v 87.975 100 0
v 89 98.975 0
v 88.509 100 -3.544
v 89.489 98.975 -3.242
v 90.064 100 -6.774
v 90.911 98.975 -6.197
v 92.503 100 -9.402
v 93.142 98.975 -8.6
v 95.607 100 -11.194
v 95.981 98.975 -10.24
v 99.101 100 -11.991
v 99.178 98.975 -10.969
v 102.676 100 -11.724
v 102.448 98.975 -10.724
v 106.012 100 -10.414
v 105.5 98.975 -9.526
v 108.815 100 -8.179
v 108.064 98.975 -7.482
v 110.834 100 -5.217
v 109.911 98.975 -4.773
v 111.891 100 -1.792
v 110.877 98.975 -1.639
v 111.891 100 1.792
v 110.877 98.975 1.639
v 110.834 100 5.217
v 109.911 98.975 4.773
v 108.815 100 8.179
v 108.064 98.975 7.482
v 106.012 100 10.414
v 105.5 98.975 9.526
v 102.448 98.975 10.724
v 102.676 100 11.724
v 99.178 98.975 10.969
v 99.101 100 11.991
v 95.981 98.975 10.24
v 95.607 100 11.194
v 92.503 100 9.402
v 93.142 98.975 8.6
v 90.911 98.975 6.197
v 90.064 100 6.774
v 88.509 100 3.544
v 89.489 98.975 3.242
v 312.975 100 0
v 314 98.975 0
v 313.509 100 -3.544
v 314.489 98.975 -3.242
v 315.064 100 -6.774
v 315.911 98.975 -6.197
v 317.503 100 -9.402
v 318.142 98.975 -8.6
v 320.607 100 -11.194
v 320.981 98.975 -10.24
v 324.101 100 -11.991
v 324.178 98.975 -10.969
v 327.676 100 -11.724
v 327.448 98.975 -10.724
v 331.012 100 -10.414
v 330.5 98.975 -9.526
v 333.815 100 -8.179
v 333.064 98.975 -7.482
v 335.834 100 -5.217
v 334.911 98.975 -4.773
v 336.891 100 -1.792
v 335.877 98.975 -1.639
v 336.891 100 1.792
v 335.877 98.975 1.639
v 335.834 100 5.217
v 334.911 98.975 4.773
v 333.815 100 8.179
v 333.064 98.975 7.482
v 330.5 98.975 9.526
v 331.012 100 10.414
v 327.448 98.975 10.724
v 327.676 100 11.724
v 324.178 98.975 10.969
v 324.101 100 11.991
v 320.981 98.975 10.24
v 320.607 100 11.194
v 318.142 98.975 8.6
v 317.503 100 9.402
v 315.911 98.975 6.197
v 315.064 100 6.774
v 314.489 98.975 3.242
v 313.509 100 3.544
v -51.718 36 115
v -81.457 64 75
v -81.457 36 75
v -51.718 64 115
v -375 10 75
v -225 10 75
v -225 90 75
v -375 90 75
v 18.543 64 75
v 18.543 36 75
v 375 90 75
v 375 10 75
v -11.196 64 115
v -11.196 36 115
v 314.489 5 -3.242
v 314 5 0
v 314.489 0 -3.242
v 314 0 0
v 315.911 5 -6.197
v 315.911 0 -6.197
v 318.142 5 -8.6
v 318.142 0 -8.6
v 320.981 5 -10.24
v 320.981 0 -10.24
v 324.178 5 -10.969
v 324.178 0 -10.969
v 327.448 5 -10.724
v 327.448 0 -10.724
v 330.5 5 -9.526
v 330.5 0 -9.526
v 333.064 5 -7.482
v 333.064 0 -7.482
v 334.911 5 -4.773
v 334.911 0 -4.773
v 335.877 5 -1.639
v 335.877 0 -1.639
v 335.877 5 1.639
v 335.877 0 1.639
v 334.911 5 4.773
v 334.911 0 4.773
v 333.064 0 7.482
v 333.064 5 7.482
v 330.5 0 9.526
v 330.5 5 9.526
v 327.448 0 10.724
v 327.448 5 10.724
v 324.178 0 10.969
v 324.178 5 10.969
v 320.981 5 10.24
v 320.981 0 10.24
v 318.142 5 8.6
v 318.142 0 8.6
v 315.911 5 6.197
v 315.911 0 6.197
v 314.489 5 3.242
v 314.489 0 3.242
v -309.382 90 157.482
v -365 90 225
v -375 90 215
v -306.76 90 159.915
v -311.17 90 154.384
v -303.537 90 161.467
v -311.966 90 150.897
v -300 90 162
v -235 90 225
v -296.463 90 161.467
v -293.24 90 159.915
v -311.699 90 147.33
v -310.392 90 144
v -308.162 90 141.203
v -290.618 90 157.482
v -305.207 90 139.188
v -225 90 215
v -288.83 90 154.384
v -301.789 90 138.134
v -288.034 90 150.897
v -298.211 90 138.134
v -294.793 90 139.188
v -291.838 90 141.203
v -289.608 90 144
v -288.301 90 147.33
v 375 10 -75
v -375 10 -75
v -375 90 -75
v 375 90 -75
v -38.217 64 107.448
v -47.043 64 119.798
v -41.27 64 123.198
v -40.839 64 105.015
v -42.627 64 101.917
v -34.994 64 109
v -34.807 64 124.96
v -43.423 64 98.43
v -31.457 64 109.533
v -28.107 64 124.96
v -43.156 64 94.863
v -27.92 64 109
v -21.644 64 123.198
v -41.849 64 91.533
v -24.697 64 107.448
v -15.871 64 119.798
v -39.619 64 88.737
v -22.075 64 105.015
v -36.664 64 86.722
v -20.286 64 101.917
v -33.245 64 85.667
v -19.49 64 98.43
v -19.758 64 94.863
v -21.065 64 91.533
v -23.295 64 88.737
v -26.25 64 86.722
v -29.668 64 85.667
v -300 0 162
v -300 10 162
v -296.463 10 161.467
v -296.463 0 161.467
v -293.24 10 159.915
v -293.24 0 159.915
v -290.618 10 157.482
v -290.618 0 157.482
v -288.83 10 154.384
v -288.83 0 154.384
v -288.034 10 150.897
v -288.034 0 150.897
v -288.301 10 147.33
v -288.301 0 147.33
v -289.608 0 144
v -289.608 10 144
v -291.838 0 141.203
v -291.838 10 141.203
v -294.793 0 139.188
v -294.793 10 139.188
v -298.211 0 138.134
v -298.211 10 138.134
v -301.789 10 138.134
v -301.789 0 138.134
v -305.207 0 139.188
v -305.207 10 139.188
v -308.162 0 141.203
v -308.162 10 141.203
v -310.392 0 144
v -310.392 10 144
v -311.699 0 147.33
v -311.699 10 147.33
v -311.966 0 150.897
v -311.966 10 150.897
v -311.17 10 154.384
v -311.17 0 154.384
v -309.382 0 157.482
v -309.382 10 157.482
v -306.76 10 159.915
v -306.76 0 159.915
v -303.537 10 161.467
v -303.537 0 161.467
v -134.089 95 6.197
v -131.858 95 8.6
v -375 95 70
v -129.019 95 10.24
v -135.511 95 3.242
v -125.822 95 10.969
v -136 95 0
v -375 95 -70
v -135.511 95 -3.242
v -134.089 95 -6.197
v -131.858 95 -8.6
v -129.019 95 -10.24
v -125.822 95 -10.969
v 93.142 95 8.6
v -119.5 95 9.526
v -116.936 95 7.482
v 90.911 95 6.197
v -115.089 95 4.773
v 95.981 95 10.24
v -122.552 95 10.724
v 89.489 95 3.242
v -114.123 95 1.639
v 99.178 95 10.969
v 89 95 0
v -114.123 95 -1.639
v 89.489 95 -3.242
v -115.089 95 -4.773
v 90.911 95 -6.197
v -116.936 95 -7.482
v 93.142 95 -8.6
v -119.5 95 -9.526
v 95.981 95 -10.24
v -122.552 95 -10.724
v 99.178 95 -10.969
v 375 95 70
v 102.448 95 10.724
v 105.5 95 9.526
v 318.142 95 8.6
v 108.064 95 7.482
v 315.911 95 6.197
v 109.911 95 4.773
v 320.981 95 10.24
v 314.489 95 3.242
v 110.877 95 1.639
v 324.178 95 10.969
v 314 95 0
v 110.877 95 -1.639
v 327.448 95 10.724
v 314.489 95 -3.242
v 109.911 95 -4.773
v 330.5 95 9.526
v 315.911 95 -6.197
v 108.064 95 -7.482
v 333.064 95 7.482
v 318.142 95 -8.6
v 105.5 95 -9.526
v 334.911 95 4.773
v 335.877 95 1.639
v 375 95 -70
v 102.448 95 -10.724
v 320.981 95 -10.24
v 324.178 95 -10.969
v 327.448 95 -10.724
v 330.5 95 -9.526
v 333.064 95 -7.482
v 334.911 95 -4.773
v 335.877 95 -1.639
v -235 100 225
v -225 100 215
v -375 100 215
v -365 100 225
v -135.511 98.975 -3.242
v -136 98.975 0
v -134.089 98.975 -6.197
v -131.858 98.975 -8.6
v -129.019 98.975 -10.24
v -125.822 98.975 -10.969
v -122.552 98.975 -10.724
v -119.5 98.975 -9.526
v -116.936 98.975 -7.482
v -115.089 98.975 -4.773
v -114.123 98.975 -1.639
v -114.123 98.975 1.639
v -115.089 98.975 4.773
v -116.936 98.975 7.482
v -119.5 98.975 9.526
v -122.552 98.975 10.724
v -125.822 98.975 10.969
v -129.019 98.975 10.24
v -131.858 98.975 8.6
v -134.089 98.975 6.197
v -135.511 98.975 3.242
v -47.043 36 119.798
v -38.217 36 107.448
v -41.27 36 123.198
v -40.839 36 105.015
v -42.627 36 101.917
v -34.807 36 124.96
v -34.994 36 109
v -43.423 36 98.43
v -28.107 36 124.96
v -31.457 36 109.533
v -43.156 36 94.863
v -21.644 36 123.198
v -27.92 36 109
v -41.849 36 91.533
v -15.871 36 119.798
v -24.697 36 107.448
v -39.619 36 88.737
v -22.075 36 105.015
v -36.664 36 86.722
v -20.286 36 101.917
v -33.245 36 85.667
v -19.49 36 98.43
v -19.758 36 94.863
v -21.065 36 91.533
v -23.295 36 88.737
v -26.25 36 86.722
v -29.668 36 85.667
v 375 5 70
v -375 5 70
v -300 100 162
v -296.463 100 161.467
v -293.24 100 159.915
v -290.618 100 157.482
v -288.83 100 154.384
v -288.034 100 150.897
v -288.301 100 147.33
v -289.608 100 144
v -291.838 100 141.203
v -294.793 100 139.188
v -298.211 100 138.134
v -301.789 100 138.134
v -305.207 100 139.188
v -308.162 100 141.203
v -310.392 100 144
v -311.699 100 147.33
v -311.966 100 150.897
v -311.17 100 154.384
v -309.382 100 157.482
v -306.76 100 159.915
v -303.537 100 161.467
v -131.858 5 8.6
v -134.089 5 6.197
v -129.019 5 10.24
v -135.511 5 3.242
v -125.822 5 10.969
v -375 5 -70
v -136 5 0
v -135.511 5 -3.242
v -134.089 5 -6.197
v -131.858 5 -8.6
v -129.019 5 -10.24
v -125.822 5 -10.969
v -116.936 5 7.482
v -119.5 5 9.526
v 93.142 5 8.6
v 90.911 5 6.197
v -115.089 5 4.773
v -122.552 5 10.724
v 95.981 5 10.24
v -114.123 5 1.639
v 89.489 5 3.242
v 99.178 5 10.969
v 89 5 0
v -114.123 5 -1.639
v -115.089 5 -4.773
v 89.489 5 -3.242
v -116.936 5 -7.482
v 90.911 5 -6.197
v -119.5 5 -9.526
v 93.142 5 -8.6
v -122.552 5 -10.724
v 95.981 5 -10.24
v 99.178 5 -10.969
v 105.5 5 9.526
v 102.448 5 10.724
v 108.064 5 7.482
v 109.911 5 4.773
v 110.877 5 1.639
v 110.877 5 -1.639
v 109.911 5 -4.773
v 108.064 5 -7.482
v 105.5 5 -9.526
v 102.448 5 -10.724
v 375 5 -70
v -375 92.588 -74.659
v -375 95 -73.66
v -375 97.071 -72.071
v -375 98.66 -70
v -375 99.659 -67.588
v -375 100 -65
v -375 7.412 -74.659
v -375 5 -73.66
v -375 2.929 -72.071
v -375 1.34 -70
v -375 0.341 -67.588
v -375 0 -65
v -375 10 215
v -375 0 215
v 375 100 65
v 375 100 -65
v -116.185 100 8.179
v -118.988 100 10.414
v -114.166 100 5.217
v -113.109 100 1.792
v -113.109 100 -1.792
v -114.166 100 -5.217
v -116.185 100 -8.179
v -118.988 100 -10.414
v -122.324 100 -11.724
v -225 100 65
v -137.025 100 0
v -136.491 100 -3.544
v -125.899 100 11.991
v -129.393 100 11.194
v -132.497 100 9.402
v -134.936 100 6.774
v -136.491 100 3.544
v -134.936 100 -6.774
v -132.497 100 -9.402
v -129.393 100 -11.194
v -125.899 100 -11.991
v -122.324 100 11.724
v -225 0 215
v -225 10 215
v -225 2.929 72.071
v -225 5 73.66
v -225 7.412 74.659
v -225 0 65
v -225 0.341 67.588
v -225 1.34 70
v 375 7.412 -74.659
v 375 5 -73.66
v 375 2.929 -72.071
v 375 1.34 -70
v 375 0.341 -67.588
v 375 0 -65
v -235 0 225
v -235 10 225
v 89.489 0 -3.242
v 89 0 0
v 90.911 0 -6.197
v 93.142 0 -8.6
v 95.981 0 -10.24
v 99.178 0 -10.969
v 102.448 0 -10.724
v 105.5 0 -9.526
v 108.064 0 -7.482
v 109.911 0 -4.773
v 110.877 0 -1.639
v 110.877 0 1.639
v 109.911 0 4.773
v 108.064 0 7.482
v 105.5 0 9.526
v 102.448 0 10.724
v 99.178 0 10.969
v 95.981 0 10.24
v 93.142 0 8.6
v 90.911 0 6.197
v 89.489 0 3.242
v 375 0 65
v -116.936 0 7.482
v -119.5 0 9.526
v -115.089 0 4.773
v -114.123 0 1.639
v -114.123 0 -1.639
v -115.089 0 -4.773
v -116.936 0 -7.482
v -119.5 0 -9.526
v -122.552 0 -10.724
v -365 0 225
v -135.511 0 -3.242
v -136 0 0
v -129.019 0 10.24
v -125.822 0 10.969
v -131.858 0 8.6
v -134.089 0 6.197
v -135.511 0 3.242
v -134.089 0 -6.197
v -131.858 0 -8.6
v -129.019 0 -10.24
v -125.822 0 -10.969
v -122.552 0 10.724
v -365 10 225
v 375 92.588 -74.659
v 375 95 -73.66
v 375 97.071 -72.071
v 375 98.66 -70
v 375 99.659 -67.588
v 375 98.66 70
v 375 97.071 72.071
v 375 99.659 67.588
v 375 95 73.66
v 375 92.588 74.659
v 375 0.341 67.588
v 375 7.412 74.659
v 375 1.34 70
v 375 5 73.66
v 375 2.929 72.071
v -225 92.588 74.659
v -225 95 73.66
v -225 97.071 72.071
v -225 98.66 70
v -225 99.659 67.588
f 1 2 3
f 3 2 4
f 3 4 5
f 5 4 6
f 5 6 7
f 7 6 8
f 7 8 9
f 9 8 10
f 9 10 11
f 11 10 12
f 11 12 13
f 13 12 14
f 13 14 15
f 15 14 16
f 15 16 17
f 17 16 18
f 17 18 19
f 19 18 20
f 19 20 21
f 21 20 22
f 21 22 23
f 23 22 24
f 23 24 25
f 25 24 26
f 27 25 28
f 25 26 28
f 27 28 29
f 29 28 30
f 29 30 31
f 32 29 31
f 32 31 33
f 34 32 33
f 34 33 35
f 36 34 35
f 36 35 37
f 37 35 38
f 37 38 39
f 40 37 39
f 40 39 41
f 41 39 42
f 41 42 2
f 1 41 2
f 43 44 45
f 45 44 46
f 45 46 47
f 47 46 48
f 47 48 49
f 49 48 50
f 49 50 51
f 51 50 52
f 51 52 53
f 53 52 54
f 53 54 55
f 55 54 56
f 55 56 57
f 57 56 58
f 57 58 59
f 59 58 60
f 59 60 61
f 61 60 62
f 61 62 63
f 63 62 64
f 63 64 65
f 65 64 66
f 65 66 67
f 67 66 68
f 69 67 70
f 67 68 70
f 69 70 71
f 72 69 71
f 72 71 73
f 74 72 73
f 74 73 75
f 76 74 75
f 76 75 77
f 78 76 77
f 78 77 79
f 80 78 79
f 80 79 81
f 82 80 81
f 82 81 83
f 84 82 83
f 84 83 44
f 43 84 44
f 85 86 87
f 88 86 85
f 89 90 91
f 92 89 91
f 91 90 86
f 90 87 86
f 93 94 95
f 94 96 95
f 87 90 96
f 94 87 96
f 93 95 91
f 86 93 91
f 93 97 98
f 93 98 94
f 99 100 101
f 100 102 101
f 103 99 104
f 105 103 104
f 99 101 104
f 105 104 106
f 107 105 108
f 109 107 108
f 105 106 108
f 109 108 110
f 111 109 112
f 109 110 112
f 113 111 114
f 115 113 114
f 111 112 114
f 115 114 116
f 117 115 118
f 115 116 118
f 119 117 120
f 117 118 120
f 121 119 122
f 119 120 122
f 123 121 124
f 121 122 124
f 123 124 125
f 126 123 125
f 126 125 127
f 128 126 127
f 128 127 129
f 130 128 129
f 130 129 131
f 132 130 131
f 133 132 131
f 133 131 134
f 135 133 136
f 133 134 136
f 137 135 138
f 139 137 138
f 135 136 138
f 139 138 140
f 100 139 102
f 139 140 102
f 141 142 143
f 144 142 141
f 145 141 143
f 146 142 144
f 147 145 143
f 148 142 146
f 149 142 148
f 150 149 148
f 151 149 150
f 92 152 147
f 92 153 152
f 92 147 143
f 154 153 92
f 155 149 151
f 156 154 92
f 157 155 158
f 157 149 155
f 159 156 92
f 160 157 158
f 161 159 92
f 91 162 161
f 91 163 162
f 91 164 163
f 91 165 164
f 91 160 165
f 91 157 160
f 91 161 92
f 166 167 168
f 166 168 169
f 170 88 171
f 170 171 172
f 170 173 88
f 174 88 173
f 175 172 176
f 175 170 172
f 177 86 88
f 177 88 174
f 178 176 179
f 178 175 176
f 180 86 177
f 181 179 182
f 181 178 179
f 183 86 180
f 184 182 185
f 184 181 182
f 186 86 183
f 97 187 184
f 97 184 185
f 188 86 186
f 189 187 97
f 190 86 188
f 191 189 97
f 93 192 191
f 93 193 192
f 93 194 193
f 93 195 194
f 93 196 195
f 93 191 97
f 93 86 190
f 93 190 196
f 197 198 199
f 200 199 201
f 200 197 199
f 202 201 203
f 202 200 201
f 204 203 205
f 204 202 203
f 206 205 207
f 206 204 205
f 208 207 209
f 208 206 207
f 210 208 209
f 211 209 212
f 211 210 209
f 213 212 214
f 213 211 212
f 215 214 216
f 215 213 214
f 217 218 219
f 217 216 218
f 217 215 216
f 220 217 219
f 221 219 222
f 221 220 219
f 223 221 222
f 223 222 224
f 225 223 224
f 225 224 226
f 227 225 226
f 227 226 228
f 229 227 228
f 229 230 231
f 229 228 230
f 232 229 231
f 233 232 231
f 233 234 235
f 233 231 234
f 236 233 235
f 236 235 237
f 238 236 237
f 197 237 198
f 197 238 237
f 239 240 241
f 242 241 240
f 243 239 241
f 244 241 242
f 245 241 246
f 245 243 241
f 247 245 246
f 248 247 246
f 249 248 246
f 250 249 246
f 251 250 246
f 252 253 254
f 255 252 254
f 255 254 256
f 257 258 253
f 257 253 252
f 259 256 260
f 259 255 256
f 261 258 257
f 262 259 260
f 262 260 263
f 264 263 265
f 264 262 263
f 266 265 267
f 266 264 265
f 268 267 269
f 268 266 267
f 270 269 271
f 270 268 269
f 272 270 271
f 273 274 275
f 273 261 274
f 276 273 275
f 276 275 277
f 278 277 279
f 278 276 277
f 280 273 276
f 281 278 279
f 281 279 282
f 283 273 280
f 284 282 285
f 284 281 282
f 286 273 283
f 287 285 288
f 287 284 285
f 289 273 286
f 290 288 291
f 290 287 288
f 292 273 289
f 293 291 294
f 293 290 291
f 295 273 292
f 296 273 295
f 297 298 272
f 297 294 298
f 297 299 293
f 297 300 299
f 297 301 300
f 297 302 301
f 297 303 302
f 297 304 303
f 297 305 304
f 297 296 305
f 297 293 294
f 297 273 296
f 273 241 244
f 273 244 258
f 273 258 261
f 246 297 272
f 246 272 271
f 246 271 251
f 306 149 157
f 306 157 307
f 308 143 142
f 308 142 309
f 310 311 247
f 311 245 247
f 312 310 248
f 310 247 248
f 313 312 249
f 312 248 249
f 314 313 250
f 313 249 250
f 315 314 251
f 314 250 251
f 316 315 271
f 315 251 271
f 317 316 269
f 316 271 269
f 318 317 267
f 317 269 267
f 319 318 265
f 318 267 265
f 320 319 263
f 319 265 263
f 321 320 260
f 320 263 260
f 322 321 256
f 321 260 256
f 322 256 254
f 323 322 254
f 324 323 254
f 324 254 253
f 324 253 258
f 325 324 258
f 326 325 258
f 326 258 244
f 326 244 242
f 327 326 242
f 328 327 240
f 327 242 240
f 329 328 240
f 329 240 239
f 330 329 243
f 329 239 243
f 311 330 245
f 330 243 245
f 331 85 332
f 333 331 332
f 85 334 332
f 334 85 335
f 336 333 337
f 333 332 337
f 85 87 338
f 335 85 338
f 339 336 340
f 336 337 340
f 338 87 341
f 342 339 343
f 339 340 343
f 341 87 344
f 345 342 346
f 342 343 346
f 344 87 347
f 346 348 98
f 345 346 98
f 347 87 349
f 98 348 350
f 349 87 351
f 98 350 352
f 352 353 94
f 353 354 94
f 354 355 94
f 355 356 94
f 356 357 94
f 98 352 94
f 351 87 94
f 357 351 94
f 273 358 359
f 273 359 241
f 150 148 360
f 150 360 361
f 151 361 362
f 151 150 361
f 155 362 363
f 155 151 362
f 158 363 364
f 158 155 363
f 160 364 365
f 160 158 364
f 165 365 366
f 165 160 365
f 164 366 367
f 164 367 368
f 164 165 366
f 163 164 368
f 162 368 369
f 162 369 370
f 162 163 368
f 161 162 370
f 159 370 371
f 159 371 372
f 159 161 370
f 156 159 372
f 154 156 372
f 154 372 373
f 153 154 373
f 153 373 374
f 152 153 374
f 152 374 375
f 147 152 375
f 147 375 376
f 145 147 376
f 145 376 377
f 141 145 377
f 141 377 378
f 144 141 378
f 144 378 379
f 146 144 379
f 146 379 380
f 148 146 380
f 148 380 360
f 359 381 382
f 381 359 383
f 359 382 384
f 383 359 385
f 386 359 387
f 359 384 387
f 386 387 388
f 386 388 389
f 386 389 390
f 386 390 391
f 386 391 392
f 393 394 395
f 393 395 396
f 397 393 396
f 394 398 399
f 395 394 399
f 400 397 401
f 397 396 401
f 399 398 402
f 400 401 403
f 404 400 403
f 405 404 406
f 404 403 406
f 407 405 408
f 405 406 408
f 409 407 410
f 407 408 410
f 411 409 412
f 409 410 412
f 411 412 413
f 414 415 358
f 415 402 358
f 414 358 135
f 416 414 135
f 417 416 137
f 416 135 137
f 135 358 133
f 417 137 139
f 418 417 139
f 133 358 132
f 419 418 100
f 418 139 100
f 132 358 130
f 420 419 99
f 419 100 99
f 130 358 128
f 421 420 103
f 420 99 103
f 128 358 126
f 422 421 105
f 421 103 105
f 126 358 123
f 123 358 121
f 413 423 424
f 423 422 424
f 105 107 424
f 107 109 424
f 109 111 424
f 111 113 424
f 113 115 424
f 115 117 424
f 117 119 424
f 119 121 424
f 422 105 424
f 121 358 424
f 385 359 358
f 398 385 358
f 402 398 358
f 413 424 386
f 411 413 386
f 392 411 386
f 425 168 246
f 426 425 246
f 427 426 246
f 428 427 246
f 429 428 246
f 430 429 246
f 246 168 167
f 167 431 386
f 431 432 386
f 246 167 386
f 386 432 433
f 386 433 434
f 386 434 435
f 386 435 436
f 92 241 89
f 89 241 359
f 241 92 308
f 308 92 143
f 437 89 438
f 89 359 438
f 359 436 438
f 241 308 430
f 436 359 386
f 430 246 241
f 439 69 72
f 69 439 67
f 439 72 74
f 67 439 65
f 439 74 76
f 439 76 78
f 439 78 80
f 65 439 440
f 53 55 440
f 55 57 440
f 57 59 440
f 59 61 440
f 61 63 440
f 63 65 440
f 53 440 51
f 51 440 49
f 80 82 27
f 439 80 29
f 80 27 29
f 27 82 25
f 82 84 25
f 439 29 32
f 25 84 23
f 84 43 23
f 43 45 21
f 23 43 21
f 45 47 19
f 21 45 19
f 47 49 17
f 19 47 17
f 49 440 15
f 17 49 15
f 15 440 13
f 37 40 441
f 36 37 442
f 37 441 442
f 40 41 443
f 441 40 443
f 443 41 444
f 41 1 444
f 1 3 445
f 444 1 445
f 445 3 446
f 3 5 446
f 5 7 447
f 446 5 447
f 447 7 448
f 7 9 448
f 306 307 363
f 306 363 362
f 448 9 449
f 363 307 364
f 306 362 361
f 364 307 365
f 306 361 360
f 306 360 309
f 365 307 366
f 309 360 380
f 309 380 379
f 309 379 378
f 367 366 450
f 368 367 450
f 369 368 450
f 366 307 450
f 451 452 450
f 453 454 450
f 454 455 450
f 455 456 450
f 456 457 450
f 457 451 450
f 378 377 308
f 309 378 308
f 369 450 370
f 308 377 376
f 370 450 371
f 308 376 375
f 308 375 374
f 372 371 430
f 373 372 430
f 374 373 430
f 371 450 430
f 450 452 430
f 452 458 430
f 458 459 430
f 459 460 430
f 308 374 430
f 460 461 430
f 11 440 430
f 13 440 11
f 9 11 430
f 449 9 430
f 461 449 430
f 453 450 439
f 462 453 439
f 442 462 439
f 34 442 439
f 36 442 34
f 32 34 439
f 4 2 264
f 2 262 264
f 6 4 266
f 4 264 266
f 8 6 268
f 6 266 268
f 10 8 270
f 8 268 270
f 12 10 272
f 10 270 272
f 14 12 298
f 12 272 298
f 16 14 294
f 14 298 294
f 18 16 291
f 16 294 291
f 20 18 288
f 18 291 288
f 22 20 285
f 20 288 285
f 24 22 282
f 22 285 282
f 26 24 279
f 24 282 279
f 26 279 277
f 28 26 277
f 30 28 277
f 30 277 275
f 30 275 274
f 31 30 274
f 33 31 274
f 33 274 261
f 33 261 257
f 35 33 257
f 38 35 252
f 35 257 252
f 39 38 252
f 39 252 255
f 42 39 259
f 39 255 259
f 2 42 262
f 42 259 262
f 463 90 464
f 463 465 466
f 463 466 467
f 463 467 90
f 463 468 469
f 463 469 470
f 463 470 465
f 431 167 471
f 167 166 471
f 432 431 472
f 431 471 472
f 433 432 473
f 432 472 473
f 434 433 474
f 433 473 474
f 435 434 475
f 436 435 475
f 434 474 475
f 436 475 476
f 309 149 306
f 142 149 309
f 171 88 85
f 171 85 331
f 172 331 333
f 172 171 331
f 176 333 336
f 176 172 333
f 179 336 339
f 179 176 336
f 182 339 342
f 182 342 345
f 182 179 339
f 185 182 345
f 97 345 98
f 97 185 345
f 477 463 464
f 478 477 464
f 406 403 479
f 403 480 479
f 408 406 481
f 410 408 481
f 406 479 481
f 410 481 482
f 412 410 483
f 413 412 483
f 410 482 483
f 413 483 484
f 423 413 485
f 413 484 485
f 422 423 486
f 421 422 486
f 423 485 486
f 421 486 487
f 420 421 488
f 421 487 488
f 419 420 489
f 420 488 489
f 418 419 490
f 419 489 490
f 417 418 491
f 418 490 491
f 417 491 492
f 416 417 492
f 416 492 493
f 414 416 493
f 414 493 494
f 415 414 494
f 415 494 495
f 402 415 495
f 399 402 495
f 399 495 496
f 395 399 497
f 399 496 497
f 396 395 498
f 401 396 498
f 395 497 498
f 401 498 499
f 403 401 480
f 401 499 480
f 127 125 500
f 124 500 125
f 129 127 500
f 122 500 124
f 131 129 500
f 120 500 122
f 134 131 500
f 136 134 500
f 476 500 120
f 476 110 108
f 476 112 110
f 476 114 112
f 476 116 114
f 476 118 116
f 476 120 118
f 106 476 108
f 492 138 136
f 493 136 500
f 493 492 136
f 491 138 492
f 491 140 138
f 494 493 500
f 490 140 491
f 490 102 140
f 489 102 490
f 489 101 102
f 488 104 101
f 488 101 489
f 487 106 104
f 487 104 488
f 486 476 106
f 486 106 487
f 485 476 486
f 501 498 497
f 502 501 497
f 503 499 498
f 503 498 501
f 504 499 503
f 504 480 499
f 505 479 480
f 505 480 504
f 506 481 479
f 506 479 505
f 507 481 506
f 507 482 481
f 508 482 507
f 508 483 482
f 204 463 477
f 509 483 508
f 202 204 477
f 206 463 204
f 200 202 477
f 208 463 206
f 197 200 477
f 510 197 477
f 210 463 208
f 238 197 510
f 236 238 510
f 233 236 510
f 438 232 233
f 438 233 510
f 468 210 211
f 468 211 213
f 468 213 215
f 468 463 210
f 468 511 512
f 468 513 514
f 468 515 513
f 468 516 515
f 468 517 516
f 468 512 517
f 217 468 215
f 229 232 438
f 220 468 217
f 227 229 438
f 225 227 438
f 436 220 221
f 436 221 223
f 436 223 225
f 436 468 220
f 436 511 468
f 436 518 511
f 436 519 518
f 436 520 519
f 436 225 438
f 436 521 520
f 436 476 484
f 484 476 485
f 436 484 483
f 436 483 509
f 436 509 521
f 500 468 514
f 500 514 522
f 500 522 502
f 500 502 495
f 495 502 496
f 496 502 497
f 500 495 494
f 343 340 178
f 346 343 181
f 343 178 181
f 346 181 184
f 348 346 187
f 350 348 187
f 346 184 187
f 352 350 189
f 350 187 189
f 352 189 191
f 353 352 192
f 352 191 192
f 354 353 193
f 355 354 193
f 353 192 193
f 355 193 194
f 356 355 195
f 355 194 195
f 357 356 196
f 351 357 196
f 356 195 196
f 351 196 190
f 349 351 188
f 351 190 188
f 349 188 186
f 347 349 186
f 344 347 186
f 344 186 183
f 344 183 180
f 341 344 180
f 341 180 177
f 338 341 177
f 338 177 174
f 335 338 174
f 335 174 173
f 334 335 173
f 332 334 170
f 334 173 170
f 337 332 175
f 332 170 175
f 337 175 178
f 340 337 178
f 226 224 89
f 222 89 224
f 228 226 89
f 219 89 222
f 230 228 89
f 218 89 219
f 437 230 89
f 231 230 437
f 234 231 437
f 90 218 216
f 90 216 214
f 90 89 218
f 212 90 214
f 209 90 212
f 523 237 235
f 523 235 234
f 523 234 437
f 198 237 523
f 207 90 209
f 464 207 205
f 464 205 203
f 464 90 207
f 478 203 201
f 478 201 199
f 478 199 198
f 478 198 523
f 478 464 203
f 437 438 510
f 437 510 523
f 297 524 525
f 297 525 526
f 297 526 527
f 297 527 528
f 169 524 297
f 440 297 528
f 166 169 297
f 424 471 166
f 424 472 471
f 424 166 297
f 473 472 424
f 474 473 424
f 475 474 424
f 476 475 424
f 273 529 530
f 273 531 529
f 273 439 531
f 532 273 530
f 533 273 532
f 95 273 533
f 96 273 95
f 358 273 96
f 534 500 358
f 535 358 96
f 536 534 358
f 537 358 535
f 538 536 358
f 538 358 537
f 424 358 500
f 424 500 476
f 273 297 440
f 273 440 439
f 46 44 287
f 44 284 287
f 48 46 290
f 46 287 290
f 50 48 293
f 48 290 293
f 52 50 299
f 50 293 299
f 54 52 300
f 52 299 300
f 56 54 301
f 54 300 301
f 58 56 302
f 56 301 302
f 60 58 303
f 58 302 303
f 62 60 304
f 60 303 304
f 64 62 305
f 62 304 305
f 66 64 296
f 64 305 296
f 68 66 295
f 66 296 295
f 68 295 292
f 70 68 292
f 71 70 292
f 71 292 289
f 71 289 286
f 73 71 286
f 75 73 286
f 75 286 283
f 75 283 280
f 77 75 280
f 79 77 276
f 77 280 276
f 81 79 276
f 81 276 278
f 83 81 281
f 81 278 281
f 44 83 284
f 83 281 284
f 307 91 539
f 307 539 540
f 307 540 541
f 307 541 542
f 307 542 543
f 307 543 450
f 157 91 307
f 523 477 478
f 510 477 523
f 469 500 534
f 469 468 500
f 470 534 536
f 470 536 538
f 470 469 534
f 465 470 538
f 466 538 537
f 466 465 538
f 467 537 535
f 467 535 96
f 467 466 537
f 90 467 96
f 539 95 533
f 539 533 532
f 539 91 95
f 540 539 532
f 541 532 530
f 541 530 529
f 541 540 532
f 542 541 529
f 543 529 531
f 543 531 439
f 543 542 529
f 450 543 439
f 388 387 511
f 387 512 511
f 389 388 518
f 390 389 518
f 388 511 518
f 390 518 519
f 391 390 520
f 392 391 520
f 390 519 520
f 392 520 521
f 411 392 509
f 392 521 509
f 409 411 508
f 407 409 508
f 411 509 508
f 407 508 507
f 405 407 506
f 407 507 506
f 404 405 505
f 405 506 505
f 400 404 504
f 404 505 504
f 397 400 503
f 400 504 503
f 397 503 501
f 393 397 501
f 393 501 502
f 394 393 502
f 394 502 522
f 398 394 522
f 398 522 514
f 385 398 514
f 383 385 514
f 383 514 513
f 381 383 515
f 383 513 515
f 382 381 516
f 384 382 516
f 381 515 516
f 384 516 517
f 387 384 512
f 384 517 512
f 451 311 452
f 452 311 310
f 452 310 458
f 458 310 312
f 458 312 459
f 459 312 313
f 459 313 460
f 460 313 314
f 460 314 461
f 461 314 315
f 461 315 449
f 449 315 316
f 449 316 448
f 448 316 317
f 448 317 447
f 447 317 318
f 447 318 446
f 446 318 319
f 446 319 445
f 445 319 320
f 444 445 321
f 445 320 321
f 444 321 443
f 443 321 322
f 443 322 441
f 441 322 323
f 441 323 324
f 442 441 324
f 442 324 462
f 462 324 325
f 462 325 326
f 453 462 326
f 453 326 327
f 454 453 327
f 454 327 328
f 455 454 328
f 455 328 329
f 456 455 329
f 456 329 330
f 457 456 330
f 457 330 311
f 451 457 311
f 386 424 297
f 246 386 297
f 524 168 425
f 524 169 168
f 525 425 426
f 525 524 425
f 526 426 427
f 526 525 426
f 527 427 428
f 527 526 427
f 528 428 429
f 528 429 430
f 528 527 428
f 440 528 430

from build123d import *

# Parameters (mm, degrees)
SKETCH1_R                        = 12
BOSS_EXTRUDE1_DEPTH              = 100
SKETCH2_W                        = 140
SKETCH2_H                        = 90
CUT_EXTRUDE1_DEPTH               = 790.382670192
CUT_EXTRUDE2_START               = 225
SKETCH3_W                        = 47.5
SKETCH3_H                        = 80
SKETCH3_W_2                      = 102.5
SKETCH3_W_3                      = 150
CUT_EXTRUDE2_DEPTH               = 150
FILLET2_R                        = 10
FILLET4_R                        = 10
CHAMFER1_SIZE                    = 10
M24X2_0_TAPPED_HOLE1_D           = 22
M24X2_0_TAPPED_HOLE1_CSINK_D     = 24.05
M24X2_0_TAPPED_HOLE1_CSINK_ANGLE = 90
BOSS_EXTRUDE3_START              = -36
SKETCH7_R                        = 12
BOSS_EXTRUDE3_DEPTH              = 28


with BuildPart() as part:
    # Sketch1 → Boss-Extrude1 (new body)
    with BuildSketch(Plane(origin=(0, 0, 0), x_dir=(1, 0, 0), z_dir=(0, 1, 0))):
        Polygon((-375, 75), (375, 75), (375, -75), (-225, -75), (-225, -225), (-375, -225), (-375, -75), align=None)
        with Locations(Location((-300, -150, 0), (0, 0, 270))):
            Circle(SKETCH1_R, mode=Mode.SUBTRACT)
    extrude(amount=BOSS_EXTRUDE1_DEPTH)

    # Sketch2 → Cut-Extrude1 (cut, through all)
    with BuildSketch(Plane(origin=(375, 0, 0), x_dir=(0, 0, -1), z_dir=(1, 0, 0))):
        with Locations((0, 50)):
            Rectangle(SKETCH2_W, SKETCH2_H)
    extrude(amount=-CUT_EXTRUDE1_DEPTH, mode=Mode.SUBTRACT)

    # Sketch3 → Cut-Extrude2 (cut)
    with BuildSketch(Plane.ZY.offset(CUT_EXTRUDE2_START)):
        with Locations((351.25, 50)):
            Rectangle(SKETCH3_W, SKETCH3_H)
        with Locations((276.25, 50)):
            Rectangle(SKETCH3_W_2, SKETCH3_H)
        with Locations((150, 50)):
            Rectangle(SKETCH3_W_3, SKETCH3_H)
    extrude(amount=CUT_EXTRUDE2_DEPTH, mode=Mode.SUBTRACT)

    # Fillet2
    fillet2_edges = [part.edges().sort_by_distance(p)[0] for p in [
        (0, 100, -75),
        (0, 0, -75),
    ]]
    fillet(fillet2_edges, radius=FILLET2_R)

    # Fillet4
    fillet4_edges = [part.edges().sort_by_distance(p)[0] for p in [
        (75, 100, 75),
        (75, 0, 75),
    ]]
    fillet(fillet4_edges, radius=FILLET4_R)

    # Chamfer1
    chamfer1_edges = [part.edges().sort_by_distance(p)[0] for p in [
        (-225, 95, 225),
        (-375, 95, 225),
        (-225, 5, 225),
        (-375, 5, 225),
    ]]
    chamfer(chamfer1_edges, length=CHAMFER1_SIZE)

    # M24x2.0 Tapped Hole1 (through all)
    with Locations(Plane(origin=(0, 100, 0), x_dir=(1, 0, 0), z_dir=(0, 1, 0))):
        with Locations((100, 0), (325, 0), (-125, 0)):
            CounterSinkHole(M24X2_0_TAPPED_HOLE1_D / 2, M24X2_0_TAPPED_HOLE1_CSINK_D / 2, counter_sink_angle=M24X2_0_TAPPED_HOLE1_CSINK_ANGLE)

    # Sketch7 → Boss-Extrude3 (add)
    with BuildSketch(Plane(origin=(0, 100, 0), x_dir=(1, 0, 0), z_dir=(0, 1, 0)).offset(BOSS_EXTRUDE3_START)):
        with BuildLine():
            Line((-81.456914067, -75), (-51.717949801, -115))
            ThreePointArc((-51.717949801, -115), (-31.456914067, -125.183627997), (-11.195878332, -115))
            Line((-11.195878332, -115), (18.543085933, -75))
            Line((18.543085933, -75), (-81.456914067, -75))
        make_face()
        with Locations(Location((-31.456914067, -97.533391436, 0), (0, 0, 270))):
            Circle(SKETCH7_R, mode=Mode.SUBTRACT)
    extrude(amount=-BOSS_EXTRUDE3_DEPTH)


solid = part.part
